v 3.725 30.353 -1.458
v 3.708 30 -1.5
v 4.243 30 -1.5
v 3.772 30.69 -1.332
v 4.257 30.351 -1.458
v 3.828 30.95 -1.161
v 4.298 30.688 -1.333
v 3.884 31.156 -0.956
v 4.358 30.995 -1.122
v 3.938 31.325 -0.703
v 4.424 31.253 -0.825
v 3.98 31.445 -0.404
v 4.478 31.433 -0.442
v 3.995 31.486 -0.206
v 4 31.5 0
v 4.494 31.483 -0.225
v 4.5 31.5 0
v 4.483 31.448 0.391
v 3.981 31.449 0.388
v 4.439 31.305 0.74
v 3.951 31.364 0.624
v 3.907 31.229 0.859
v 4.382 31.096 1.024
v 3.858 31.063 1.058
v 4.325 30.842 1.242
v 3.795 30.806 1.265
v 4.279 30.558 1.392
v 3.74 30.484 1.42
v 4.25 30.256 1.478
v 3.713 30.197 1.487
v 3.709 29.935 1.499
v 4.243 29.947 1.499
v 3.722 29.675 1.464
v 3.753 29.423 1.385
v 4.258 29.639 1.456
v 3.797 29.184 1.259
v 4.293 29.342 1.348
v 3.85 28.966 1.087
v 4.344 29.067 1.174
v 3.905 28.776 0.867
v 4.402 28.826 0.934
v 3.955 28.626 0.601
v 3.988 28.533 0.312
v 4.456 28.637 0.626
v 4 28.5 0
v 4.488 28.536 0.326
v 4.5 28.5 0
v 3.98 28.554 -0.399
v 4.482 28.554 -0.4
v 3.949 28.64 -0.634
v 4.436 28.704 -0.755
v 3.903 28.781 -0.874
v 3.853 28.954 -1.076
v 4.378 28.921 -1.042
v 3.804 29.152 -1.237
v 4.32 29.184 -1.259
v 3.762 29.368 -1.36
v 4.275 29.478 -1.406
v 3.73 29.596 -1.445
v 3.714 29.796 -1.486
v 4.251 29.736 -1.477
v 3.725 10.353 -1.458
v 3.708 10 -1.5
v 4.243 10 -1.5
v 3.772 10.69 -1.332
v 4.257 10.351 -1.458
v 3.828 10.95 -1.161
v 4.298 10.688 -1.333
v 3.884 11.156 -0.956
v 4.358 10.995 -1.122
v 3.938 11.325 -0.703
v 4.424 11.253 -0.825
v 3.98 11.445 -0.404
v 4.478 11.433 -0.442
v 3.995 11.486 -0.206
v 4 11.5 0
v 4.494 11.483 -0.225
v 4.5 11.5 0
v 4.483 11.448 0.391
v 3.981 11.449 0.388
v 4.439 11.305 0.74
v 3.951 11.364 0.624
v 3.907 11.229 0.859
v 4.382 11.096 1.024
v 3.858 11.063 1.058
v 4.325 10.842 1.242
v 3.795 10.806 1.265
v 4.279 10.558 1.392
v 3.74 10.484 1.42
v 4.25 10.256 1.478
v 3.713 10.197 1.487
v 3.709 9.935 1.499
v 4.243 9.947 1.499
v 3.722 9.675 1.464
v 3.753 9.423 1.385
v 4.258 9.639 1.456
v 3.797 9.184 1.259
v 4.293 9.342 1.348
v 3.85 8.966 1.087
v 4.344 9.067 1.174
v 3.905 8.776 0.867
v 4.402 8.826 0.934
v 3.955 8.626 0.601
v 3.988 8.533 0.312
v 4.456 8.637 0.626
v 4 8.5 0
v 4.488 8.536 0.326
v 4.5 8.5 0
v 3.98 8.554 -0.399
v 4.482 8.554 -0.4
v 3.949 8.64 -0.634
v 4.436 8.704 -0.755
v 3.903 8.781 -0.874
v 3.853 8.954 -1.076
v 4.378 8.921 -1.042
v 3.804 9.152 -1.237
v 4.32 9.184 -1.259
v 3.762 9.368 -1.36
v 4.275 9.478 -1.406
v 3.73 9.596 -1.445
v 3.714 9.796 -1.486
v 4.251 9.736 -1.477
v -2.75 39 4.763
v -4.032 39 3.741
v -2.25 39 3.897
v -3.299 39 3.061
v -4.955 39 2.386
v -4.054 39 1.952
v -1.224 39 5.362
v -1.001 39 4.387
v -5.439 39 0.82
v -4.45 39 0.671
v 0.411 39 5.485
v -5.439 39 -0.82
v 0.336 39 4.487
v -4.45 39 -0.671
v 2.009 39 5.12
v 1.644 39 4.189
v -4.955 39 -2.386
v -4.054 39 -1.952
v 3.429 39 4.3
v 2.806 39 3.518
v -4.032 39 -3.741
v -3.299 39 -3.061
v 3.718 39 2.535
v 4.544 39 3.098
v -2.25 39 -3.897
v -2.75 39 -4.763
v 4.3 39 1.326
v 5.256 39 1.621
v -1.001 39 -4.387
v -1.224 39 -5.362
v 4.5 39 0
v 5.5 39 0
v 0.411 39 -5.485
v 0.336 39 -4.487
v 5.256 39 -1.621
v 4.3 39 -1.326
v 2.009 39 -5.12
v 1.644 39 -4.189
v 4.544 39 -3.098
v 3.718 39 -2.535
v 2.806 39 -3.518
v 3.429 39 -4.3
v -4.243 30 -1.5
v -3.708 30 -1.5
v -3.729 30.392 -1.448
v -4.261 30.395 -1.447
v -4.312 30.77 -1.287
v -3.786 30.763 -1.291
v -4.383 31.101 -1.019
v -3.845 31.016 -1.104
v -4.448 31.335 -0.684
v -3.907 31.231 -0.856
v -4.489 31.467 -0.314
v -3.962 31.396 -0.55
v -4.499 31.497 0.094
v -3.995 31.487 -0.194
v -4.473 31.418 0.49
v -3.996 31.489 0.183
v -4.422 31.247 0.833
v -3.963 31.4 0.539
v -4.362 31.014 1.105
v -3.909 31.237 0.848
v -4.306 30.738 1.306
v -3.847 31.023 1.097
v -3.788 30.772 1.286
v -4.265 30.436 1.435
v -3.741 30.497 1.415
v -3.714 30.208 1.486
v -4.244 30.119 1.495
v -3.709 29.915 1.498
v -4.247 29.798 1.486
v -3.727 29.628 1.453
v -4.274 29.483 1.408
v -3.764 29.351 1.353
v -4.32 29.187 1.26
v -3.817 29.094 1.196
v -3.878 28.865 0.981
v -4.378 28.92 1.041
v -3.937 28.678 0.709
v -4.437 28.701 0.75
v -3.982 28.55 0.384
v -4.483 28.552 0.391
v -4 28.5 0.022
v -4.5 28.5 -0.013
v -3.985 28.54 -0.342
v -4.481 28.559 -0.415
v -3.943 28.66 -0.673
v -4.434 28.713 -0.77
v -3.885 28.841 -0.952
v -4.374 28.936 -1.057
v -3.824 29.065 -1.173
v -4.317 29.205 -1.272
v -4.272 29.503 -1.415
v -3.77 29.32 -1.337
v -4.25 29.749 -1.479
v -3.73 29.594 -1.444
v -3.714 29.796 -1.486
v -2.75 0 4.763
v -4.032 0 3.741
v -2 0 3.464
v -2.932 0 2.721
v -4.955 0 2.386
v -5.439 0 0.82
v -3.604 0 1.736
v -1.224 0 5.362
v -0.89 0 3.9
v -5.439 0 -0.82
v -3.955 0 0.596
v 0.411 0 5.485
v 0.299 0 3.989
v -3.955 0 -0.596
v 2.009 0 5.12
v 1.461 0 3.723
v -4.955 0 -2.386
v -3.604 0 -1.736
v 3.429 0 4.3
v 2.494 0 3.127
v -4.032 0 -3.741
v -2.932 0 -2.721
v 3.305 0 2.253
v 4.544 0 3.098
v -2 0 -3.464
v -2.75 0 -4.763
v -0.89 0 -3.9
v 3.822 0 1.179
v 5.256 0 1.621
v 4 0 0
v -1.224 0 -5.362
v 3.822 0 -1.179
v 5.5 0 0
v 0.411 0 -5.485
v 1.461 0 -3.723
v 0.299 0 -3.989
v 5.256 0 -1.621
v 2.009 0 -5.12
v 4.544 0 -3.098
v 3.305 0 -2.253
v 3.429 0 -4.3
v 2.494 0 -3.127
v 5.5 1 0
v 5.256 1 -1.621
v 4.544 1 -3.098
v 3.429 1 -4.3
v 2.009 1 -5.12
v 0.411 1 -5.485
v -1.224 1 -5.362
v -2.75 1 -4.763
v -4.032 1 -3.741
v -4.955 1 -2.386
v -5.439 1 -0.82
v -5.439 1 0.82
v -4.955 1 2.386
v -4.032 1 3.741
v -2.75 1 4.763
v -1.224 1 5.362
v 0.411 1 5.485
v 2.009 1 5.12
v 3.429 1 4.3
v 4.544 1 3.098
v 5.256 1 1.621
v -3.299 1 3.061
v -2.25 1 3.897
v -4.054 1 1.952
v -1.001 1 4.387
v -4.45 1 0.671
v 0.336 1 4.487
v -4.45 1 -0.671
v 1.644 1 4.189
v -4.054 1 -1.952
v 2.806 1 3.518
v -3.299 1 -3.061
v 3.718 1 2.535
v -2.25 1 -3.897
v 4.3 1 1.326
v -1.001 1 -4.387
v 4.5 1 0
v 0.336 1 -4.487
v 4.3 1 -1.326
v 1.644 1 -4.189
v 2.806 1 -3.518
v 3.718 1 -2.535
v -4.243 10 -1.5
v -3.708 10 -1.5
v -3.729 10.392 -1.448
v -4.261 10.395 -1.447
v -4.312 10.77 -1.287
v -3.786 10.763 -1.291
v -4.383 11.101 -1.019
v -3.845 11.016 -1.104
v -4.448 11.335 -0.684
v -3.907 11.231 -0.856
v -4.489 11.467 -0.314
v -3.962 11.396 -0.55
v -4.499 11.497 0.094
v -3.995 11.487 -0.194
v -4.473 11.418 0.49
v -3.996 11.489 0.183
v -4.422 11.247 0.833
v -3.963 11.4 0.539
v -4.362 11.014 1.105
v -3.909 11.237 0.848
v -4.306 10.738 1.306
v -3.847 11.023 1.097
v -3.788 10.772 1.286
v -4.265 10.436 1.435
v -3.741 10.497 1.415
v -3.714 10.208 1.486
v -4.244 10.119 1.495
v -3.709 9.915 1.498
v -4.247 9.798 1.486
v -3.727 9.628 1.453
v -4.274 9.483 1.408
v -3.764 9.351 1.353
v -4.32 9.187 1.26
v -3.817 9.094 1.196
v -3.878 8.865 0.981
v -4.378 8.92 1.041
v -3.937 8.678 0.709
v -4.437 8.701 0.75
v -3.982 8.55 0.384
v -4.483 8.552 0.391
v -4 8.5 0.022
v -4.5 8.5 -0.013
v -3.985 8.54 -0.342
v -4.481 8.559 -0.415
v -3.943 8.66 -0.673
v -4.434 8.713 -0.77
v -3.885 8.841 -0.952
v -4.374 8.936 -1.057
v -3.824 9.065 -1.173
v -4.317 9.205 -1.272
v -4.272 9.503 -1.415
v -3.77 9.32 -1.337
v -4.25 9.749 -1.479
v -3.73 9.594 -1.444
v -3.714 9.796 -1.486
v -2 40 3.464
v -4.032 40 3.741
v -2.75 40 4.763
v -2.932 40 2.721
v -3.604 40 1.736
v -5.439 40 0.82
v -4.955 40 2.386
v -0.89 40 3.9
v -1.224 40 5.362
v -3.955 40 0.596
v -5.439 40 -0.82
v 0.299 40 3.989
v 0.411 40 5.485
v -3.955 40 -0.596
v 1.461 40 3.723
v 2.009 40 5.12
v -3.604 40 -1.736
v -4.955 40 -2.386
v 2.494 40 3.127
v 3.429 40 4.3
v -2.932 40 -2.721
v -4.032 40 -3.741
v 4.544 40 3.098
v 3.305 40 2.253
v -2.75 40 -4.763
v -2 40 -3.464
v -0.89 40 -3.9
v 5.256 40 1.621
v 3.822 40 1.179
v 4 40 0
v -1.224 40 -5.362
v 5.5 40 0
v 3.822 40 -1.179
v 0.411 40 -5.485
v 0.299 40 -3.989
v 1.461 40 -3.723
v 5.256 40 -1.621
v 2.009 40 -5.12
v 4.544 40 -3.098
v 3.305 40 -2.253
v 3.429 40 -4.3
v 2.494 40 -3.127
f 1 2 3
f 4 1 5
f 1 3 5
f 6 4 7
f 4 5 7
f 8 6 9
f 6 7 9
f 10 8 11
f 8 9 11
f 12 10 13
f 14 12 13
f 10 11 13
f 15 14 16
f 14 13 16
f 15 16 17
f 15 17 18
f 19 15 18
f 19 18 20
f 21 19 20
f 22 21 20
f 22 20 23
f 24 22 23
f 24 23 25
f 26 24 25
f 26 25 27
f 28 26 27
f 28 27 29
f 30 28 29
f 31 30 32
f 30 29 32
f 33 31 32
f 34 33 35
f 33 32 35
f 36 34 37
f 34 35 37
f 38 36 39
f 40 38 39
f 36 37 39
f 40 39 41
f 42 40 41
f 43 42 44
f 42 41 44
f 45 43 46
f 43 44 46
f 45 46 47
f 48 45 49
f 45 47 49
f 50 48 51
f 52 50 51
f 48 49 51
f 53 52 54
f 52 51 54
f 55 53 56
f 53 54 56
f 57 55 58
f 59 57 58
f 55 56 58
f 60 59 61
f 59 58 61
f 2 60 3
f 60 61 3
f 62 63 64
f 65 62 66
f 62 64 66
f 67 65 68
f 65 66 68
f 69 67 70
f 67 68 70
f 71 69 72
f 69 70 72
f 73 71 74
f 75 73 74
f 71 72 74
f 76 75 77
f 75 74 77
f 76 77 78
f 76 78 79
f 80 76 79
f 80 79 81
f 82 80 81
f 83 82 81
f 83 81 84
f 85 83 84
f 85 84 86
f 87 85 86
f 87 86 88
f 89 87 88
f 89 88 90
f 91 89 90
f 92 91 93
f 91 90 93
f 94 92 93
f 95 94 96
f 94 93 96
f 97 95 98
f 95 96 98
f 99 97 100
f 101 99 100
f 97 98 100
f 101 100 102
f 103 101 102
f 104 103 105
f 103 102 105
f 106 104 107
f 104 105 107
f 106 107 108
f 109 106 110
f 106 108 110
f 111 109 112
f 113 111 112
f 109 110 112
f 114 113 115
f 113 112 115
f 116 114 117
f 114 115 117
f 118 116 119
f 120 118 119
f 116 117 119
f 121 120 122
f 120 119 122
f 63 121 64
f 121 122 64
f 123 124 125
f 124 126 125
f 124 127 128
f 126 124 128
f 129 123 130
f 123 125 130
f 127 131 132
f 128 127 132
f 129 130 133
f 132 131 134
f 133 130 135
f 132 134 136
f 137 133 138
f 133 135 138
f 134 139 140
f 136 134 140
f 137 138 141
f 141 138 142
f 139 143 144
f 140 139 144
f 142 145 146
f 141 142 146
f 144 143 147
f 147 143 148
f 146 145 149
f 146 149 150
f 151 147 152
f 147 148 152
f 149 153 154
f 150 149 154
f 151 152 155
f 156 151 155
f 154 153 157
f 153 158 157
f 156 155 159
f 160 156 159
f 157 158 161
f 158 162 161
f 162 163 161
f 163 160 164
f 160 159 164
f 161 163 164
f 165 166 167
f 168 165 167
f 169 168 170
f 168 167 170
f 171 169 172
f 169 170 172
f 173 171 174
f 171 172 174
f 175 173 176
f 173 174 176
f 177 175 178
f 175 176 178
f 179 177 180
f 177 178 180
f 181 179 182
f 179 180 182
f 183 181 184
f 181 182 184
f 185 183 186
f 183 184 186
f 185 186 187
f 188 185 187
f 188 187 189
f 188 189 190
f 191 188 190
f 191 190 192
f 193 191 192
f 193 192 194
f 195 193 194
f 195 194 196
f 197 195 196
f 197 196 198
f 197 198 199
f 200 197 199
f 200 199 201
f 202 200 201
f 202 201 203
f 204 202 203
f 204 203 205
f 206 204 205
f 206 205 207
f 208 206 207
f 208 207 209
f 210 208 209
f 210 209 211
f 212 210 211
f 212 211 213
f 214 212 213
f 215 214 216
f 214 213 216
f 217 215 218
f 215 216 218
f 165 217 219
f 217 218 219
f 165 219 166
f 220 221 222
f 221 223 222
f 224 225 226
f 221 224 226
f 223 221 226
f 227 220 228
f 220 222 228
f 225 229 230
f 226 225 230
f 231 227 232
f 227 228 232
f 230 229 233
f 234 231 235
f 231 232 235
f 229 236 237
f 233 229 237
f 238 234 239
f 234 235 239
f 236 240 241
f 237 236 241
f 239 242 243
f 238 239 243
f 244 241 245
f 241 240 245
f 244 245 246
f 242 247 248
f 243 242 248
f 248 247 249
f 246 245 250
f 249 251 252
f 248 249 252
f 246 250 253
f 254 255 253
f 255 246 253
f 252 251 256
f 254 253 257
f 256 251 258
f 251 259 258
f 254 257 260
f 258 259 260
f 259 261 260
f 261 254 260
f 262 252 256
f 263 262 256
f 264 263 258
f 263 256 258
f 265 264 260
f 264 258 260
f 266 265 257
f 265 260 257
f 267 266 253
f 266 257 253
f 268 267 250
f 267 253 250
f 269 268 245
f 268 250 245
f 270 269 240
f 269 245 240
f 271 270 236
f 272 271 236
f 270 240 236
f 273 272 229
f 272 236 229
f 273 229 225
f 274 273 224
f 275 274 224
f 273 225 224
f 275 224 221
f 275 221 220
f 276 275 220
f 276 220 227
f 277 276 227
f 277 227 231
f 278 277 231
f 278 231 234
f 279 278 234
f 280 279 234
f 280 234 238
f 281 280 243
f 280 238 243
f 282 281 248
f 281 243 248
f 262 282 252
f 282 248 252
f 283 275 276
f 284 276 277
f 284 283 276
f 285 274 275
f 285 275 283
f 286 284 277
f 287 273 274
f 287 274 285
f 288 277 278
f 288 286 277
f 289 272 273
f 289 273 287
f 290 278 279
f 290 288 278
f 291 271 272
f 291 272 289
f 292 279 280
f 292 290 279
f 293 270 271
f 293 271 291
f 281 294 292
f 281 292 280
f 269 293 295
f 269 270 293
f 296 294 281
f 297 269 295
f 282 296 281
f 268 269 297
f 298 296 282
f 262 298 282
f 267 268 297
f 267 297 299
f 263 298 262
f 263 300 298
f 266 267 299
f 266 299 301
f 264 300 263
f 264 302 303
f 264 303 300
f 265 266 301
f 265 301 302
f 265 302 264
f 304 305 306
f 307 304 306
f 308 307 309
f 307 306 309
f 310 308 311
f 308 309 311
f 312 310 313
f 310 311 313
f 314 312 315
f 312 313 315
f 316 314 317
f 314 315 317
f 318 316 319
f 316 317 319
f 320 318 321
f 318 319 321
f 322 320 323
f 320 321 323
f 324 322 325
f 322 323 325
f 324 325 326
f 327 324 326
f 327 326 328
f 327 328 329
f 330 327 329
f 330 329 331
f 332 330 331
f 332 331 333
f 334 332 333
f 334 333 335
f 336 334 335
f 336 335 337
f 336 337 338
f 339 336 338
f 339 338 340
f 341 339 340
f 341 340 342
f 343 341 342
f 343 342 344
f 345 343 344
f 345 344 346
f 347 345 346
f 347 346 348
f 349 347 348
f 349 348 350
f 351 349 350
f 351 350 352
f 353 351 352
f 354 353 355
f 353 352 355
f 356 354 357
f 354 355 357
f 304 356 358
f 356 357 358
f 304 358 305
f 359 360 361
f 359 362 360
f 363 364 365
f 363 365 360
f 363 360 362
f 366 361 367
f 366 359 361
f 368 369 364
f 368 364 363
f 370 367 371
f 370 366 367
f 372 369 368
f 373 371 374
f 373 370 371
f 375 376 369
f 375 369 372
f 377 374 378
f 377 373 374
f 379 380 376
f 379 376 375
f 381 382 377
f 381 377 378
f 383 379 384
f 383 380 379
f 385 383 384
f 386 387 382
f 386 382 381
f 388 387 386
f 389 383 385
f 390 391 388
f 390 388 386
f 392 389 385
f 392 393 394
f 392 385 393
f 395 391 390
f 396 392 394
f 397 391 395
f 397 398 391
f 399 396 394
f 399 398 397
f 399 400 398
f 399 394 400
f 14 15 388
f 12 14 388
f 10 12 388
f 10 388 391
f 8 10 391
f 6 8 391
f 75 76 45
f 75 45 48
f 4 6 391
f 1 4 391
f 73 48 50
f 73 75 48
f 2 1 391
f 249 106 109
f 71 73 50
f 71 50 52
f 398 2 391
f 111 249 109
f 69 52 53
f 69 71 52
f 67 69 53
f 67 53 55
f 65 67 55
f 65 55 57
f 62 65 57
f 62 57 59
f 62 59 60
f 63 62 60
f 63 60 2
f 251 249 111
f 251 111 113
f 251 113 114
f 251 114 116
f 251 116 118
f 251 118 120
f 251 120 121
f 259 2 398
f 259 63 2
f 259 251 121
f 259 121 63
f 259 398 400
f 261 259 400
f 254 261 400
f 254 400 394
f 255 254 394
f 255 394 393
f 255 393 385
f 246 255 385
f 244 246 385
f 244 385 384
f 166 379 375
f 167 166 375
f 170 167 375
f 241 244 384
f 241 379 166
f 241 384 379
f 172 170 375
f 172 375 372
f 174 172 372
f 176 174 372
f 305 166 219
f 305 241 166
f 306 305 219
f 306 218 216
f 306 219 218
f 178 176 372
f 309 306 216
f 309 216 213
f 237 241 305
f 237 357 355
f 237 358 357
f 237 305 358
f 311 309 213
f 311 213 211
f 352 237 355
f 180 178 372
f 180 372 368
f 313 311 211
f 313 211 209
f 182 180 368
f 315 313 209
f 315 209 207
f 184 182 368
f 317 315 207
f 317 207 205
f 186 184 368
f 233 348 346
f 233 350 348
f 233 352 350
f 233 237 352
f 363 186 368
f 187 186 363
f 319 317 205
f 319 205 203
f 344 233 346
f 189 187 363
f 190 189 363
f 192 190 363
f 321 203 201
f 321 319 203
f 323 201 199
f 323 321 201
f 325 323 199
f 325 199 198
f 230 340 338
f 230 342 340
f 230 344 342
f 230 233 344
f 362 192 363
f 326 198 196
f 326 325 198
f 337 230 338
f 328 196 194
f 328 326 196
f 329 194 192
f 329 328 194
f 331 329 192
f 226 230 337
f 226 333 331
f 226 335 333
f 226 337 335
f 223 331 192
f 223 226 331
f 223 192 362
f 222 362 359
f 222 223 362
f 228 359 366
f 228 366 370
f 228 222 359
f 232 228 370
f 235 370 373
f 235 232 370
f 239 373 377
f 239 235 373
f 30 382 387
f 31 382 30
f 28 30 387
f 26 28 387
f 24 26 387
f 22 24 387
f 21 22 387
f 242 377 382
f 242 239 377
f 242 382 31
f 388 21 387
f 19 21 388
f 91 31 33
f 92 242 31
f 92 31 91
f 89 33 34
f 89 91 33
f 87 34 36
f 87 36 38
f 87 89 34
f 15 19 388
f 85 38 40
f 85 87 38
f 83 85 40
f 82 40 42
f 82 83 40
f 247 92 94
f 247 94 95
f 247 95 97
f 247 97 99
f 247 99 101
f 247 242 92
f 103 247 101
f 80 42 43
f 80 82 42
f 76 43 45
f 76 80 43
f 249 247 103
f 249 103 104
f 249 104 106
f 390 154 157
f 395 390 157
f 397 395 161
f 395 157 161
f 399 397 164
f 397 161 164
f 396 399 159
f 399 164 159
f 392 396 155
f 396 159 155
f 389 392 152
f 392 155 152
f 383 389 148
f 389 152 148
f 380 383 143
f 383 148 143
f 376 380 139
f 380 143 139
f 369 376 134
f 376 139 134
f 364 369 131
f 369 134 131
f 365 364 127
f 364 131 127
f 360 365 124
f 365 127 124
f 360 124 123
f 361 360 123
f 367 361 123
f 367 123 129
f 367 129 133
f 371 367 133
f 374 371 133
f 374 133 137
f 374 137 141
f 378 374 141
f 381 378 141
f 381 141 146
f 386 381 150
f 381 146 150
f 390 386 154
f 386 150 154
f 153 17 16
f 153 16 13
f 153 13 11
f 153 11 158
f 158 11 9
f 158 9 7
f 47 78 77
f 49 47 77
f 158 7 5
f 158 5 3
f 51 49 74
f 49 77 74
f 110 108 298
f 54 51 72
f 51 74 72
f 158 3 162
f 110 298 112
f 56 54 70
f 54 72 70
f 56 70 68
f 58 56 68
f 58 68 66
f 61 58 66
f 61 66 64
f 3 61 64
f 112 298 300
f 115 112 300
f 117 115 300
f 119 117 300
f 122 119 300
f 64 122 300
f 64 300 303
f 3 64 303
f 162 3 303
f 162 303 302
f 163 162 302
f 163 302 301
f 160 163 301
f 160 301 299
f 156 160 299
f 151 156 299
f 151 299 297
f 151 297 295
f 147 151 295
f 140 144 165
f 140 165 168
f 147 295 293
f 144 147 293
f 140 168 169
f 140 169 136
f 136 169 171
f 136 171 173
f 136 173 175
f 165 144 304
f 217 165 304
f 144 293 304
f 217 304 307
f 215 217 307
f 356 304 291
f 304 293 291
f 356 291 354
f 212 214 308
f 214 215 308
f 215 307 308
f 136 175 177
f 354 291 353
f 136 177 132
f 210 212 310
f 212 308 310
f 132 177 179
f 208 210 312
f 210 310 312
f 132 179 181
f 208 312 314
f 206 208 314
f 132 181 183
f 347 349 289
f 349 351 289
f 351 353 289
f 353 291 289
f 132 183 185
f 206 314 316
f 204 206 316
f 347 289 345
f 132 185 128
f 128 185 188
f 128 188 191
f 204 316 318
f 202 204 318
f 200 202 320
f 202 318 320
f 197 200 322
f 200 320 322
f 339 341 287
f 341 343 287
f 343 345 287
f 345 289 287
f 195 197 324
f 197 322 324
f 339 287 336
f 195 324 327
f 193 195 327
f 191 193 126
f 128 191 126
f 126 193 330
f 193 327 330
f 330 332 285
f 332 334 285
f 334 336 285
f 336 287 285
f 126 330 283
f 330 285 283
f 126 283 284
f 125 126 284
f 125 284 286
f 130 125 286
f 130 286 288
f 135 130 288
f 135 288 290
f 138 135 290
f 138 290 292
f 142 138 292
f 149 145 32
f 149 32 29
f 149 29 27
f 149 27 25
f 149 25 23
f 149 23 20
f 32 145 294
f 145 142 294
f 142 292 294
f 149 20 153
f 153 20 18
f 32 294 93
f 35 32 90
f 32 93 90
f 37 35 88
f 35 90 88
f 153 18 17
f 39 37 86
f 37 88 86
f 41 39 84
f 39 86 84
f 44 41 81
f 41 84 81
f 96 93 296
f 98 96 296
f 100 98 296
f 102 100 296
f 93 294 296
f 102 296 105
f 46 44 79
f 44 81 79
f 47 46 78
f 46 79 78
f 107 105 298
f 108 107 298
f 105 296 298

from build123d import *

# Parameters (mm, degrees)
SKETCH1_R           = 5.5
SKETCH1_R_2         = 4
BOSS_EXTRUDE1_DEPTH = 1
SKETCH1_3_R         = 4.5
SKETCH1_3_R_2       = 4
BOSS_EXTRUDE2_DEPTH = 40
BOSS_EXTRUDE3_START = 39
SKETCH1_4_R         = 5.5
SKETCH1_4_R_2       = 4.5
BOSS_EXTRUDE3_DEPTH = 1
SKETCH2_R           = 1.5
CUT_EXTRUDE1_DEPTH  = 32


with BuildPart() as part:
    # Sketch1 → Boss-Extrude1 (new body)
    with BuildSketch(Plane(origin=(0, 0, 0), x_dir=(1, 0, 0), z_dir=(0, 1, 0))):
        Circle(SKETCH1_R)
        Circle(SKETCH1_R_2, mode=Mode.SUBTRACT)
    extrude(amount=BOSS_EXTRUDE1_DEPTH)

    # Sketch1<3> → Boss-Extrude2 (add)
    with BuildSketch(Plane(origin=(0, 0, 0), x_dir=(1, 0, 0), z_dir=(0, 1, 0))):
        Circle(SKETCH1_3_R)
        Circle(SKETCH1_3_R_2, mode=Mode.SUBTRACT)
    extrude(amount=BOSS_EXTRUDE2_DEPTH)

    # Sketch1<4> → Boss-Extrude3 (add)
    with BuildSketch(Plane(origin=(0, 0, 0), x_dir=(1, 0, 0), z_dir=(0, 1, 0)).offset(BOSS_EXTRUDE3_START)):
        Circle(SKETCH1_4_R)
        Circle(SKETCH1_4_R_2, mode=Mode.SUBTRACT)
    extrude(amount=BOSS_EXTRUDE3_DEPTH)

    # Sketch2 → Cut-Extrude1 (cut)
    with BuildSketch(Plane(origin=(4.5, 0, 0), x_dir=(0, 0, -1), z_dir=(1, 0, 0))):
        with Locations((0, 10)):
            Circle(SKETCH2_R)
        with Locations((0, 30)):
            Circle(SKETCH2_R)
    extrude(amount=-CUT_EXTRUDE1_DEPTH, mode=Mode.SUBTRACT)


solid = part.part
